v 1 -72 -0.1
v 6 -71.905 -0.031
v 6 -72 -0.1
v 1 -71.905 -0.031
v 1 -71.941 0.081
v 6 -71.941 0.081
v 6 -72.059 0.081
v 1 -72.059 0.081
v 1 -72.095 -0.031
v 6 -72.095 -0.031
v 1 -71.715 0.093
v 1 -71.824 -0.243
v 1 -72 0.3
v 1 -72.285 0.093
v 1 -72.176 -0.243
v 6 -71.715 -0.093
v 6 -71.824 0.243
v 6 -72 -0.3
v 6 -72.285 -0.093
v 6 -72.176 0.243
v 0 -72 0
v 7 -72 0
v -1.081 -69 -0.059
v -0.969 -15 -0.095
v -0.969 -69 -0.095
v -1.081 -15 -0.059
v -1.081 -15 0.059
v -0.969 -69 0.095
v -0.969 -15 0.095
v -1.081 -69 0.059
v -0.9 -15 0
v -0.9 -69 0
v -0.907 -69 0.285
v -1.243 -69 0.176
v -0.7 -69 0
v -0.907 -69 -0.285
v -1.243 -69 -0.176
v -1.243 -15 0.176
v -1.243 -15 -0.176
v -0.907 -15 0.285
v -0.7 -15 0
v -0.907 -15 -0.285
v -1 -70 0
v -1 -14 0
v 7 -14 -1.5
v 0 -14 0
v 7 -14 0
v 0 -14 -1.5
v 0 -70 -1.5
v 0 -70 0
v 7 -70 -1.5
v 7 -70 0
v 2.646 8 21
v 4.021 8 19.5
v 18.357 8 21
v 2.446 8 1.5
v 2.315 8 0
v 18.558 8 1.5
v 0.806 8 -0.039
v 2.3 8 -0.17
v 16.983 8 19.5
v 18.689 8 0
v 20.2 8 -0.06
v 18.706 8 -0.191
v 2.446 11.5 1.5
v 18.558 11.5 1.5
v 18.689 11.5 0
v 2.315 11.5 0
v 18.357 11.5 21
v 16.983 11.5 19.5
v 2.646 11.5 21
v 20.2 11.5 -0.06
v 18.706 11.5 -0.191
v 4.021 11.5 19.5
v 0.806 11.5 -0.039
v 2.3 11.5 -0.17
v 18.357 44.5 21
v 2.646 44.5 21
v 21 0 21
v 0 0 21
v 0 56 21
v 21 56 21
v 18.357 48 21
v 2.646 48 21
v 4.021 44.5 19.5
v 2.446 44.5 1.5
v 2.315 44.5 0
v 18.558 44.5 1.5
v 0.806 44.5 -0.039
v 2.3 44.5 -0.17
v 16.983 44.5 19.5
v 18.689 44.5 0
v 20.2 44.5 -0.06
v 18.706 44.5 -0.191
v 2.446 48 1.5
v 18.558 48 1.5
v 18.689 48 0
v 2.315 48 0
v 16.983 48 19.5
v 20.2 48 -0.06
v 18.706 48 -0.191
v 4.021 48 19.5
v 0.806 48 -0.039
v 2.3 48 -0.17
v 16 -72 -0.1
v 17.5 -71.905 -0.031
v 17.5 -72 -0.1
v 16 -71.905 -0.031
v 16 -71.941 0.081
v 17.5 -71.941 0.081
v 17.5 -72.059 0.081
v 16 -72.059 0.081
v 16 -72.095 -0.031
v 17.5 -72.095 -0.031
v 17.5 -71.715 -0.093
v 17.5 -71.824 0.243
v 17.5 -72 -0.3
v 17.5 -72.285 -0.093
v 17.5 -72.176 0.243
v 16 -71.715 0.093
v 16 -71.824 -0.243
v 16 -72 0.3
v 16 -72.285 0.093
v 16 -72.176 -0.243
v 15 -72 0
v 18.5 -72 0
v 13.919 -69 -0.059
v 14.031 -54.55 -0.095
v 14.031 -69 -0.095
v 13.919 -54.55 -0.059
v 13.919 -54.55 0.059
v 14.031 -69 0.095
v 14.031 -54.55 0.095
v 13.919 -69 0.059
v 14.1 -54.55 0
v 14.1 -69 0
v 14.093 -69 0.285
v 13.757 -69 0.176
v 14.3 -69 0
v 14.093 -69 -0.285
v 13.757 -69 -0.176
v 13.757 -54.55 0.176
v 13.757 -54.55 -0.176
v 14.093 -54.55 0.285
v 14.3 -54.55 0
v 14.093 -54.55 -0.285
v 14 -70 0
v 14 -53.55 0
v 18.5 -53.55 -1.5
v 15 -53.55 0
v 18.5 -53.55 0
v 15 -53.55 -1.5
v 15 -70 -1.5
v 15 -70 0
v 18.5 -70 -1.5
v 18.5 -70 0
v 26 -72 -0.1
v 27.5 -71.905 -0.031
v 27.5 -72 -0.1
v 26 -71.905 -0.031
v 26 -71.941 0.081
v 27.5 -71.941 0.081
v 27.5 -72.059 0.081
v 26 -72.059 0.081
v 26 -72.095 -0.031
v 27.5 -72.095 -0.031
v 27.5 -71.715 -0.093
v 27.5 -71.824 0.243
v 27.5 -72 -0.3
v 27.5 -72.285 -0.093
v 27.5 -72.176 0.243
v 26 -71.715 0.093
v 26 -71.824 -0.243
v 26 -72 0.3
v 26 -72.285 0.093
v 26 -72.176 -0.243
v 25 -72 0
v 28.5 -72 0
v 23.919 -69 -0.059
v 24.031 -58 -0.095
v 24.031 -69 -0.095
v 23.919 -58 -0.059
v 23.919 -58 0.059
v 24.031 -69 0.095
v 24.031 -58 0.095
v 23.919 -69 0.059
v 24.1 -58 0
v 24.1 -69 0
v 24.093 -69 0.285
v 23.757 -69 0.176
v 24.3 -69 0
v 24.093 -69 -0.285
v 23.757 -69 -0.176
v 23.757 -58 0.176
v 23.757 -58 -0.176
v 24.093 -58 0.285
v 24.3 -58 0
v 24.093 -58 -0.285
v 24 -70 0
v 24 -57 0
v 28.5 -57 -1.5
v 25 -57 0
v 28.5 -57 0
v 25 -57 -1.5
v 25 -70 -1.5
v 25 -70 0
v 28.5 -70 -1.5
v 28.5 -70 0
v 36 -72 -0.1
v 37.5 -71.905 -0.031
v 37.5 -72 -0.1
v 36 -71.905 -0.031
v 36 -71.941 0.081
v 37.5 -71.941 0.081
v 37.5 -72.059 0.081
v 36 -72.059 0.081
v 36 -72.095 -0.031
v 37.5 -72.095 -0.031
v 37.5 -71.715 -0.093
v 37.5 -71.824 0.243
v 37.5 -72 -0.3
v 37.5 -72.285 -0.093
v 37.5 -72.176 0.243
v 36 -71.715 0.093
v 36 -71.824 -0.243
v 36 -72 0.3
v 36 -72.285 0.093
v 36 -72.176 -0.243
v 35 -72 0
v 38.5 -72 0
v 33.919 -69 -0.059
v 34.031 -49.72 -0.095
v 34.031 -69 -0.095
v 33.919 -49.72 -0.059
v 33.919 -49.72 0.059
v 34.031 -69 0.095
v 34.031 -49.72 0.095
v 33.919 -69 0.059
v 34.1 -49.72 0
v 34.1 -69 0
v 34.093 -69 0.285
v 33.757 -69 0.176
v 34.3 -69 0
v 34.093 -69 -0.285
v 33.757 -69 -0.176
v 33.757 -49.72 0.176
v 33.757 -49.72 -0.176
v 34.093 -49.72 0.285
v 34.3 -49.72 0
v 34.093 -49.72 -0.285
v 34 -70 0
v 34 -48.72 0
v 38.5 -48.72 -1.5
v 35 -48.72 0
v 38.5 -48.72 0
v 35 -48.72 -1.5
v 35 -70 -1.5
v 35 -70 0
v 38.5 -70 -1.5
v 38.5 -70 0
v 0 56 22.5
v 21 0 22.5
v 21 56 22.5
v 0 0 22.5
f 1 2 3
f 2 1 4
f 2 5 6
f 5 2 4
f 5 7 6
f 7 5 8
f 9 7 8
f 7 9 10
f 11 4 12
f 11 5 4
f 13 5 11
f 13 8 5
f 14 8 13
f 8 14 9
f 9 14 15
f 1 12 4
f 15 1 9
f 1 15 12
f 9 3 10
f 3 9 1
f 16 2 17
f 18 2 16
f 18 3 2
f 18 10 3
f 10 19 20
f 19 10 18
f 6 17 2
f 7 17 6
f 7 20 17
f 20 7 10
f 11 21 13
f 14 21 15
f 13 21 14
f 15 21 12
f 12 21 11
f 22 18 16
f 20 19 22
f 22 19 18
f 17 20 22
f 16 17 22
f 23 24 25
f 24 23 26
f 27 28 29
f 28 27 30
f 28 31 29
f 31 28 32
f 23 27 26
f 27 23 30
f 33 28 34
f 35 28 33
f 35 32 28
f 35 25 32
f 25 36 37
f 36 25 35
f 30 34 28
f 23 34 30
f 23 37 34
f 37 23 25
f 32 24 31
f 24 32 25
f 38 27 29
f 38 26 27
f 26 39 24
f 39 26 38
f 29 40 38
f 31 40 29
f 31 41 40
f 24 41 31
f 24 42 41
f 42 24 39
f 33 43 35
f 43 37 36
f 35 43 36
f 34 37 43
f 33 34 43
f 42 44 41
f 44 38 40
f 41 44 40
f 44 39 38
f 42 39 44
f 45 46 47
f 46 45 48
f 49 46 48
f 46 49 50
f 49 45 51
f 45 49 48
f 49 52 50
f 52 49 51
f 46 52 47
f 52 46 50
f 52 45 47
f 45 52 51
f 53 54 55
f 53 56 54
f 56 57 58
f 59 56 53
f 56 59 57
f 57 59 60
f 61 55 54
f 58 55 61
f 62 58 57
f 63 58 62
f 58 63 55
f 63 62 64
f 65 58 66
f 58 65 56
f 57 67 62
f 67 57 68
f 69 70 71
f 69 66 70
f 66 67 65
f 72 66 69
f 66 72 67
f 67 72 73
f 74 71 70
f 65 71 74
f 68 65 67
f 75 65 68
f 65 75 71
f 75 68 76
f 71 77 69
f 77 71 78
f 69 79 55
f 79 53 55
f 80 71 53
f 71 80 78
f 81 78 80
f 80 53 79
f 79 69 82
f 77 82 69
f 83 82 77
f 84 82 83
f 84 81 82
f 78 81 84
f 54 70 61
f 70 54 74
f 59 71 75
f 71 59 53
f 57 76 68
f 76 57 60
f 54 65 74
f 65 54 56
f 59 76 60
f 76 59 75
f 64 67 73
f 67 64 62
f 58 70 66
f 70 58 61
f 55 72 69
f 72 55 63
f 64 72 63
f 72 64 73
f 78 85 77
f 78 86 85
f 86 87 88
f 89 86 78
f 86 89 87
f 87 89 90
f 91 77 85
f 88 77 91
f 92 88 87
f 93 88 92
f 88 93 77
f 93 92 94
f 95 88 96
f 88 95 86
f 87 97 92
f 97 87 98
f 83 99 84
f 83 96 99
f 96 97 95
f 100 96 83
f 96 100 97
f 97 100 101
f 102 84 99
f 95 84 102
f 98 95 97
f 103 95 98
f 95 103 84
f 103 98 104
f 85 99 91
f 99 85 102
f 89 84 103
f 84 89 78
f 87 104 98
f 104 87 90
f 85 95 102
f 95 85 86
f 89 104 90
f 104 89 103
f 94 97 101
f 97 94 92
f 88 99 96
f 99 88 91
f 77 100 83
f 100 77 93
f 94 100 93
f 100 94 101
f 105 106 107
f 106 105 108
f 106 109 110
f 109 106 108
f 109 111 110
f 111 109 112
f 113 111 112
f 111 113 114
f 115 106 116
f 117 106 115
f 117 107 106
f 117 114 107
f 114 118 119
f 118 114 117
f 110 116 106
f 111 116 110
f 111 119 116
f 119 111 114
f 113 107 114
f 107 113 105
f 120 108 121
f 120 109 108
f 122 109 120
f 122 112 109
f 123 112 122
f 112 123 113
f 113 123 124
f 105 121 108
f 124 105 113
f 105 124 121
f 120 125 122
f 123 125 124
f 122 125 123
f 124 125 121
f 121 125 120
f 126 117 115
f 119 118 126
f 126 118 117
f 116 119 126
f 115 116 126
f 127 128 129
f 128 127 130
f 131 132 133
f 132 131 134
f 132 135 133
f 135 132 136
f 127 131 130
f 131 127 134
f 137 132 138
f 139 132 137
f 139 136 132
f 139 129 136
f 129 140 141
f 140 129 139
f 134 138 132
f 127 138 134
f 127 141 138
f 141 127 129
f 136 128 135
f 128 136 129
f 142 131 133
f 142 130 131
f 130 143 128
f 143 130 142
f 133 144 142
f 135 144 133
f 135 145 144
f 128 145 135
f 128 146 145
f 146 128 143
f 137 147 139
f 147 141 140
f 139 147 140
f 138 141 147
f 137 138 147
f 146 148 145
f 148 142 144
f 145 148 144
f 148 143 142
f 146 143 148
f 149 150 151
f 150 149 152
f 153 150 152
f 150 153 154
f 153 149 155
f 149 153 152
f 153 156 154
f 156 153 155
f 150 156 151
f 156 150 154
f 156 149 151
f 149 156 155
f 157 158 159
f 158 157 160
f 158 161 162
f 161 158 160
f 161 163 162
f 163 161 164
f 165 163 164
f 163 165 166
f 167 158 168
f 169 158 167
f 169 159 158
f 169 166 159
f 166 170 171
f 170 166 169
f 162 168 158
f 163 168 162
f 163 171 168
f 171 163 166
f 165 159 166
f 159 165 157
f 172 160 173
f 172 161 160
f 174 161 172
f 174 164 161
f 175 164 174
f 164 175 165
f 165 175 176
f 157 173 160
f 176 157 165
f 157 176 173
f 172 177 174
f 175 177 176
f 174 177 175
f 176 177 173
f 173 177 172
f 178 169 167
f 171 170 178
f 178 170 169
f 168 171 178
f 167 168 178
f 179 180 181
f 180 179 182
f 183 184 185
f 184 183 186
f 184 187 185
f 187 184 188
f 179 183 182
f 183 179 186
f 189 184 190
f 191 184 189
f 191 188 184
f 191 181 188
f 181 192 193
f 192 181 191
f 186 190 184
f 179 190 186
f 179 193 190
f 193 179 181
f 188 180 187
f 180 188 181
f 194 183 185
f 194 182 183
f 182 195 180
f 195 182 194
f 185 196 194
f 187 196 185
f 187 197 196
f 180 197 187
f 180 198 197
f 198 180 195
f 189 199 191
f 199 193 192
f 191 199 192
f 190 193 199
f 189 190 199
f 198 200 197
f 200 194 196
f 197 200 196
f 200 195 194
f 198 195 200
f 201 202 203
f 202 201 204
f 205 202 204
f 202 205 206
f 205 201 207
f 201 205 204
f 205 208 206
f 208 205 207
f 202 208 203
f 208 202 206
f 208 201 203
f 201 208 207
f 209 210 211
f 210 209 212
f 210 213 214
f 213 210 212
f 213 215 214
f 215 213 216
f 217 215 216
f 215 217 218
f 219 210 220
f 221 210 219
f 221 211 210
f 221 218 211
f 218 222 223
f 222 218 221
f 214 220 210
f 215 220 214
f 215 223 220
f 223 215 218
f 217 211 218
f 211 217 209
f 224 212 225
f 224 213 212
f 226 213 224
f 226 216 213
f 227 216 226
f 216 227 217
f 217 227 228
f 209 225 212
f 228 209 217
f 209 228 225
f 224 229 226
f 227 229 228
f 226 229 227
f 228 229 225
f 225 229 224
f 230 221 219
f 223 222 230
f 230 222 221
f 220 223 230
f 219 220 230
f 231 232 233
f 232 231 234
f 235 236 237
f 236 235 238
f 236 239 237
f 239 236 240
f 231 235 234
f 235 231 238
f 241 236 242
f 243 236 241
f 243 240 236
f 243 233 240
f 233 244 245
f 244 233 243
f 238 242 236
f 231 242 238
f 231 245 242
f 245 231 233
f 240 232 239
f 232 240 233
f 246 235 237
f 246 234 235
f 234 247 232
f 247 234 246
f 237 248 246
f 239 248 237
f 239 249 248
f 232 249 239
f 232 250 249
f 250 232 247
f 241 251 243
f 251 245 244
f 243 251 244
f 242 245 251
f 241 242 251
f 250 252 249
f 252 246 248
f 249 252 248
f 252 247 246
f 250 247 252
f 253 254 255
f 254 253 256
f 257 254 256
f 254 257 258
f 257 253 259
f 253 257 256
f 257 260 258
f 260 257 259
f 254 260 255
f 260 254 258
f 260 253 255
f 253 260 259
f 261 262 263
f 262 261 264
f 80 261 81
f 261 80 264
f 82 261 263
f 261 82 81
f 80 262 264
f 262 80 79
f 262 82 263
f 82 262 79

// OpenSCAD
// file: ../lib/common.scad
//--------------------------------------------------------------------------------------------------
// Module Prism
//--------------------------------------------------------------------------------------------------
module prism(z, y, x)
{
    rotate([0, 90, 0])
    {
        polyhedron(
                points=[[0,0,0], [x,0,0], [x,y,0], [0,y,0], [0,y,z], [x,y,z]],
                faces=[[0,1,2,3],[5,4,3,2],[0,4,5,1],[0,3,4],[5,2,1]]);
    }
}

//--------------------------------------------------------------------------------------------------
// Module Side panel
//--------------------------------------------------------------------------------------------------
module rect_cut(x, y, z, dx, dy)
{
    // Top panel
    translate([0, dy, 0])
    {
        cube([x, y - dy, z]);
    };

    // Left bottom panel
    translate([0, 0, 0])
    {
        cube([dx, dy, z]);
    };

    // Triangle
    translate([dx, 0, 0])
    {
        rotate([0, 0, 0])
        {
            prism(x - dx, dy, -z);
        }
    };
}

//--------------------------------------------------------------------------------------------------
// X dimensional arrow
//--------------------------------------------------------------------------------------------------
module arrow_x(l)
{
    line_w = 0.1;
    arrow_w = 1;
    arrow_h = 0.3;

    // Line
    translate([l / 2, 0, 0])
    {
        rotate([0, 90, 0])
        {
            color([0.4, 0.4, 0.4])
            cylinder(l - arrow_w * 2, line_w, line_w, true);
        }
    }

    // Left arrow
    translate([arrow_w, 0, 0])
    {
        rotate([0, 270, 0])
        {
            color([0.4, 0.4, 0.4])
            cylinder(arrow_w, arrow_h, 0, false);
        }
    }

    // Right arrow
    translate([l - arrow_w, 0, 0])
    {
        rotate([0, 90, 0])
        {
            color([0.4, 0.4, 0.4])
            cylinder(arrow_w, arrow_h, 0, false);
        }
    }

    // Text
    translate([l/3, 0.5, 0])
    {
        color([0.4, 0.4, 0.4])
        text(str(l), size=1);
    }
}

//--------------------------------------------------------------------------------------------------
// Y dimensional arrow
//--------------------------------------------------------------------------------------------------
module arrow_y(l)
{
    line_w = 0.1;
    arrow_w = 1;
    arrow_h = 0.3;

    // Line
    translate([0, l / 2, 0])
    {
        rotate([90, 0, 00])
        {
            color([0.4, 0.4, 0.4])
            cylinder(l - arrow_w * 2, line_w, line_w, true);
        }
    }

    // Left arrow
    translate([0 ,arrow_w, 0])
    {
        rotate([90, 0, 0])
        {
            color([0.4, 0.4, 0.4])
            cylinder(arrow_w, arrow_h, 0, false);
        }
    }

    // Right arrow
    translate([0, l - arrow_w, 0])
    {
        rotate([270, 0, 0])
        {
            color([0.4, 0.4, 0.4])
            cylinder(arrow_w, arrow_h, 0, false);
        }
    }

    // Text
    translate([-0.5, l/3, 0])
    {
        rotate([0 ,0, 90])
        {
            color([0.4, 0.4, 0.4])
            text(str(l), size=1);
        }
    }
}

//--------------------------------------------------------------------------------------------------
// Z dimensional arrow
//--------------------------------------------------------------------------------------------------
module arrow_z(l)
{
    line_w = 0.11;
    arrow_w = 1;
    arrow_h = 0.3;

    // Line
    translate([0, 0, l / 2])
    {
        rotate([0, 0, 0])
        {
            color([0.4, 0.4, 0.4])
            cylinder(l - arrow_w * 2, line_w, line_w, true);
        }
    }

    // Left arrow
    translate([0, 0, arrow_w])
    {
        rotate([0, 180, 0])
        {
            color([0.4, 0.4, 0.4])
            cylinder(arrow_w, arrow_h, 0, false);
        }
    }

    // Right arrow
    translate([0, 0, l - arrow_w])
    {
        rotate([0, 0, 0])
        {
            color([0.4, 0.4, 0.4])
            cylinder(arrow_w, arrow_h, 0, false);
        }
    }

    // Text
    translate([0.5, 0, l/3])
    {
        rotate([90 ,0, 90])
        {
            color([0.4, 0.4, 0.4])
            text(str(l), size=1);
        }
    }
}

//--------------------------------------------------------------------------------------------------
// parallelogram
//--------------------------------------------------------------------------------------------------
module parallelogram(x = 12, y = 12, z = 1, xd = 0)
{
    points = [
        [0, 0, 0 ],        //0
        [x, 0, 0 ],        //1
        [x + xd, y, 0],    //2
        [xd, y, 0 ],       //3
        [0, 0, z ],        //4
        [x, 0, z ],        //5
        [x + xd, y, z ],   //6
        [xd, y, z ]];      //7

    faces = [
        [0,1,2,3],         // bottom
        [4,5,1,0],         // front
        [7,6,5,4],         // top
        [5,6,2,1],         // right
        [6,7,3,2],         // back
        [7,4,0,3]];        // left

    polyhedron(points, faces);
}

//--------------------------------------------------------------------------------------------------
// common board
//--------------------------------------------------------------------------------------------------
module board(w, h, d, r, g, b)
{
    color([r, g, b])
    cube([w, h, d]);
}

//--------------------------------------------------------------------------------------------------
// board dimension
//--------------------------------------------------------------------------------------------------
module dimension(w, h, d, r, g, b, part_x, part_y)
{
    translate([part_x, -part_y, 0])
    {
        rotate([-90, 0, 0])
        {
            board(w, h, d, r, g, b);
        }
            
        translate([0, -2, 0])
        {
            color([0, 0, 0])
            arrow_x(w);
        };

        translate([-1, 0, 0])
        {
            color([0, 0, 0])
            arrow_y(d);
        };
    }
}
// main file
/*
21 X 56
*/

include <../lib/common.scad>

// Top
// 56
dimension(7, 1.5, 56, 0.5, 0.5, 0, 0, 70);

translate([0, 0, 21])
{
    board(7, 56, 1.5, 0.5, 0.5, 0);
}

translate([7, 0, 21])
{
    board(7, 56, 1.5, 0.5, 0.5, 0);
}

translate([14, 0, 21])
{
    board(7, 56, 1.5, 0.5, 0.5, 0);
}

// legs
translate([0,11.5,0])
{
    translate([2.25, 0, 0])
    {
        rotate([0, 0, 270])
        {
            board(3.5, 16.45, 1.5, 0.5, 0.8, 0.8);
        }
    }

    translate([4, 0, 19.5])
    {
        rotate([0, 0, 270])
        {
            board(3.5, 13, 1.5, 1, 0.8, 0.8);
        }
    }

    translate([2.3, 0, -0.17])
    {
        rotate([85, 0, 270])
        {
            board(3.5, 21.28, 1.5, 0, 0.3, 1);
        }
    }

    translate([20.2, 0, -0.06])
    {
        rotate([95, 0, 270])
        {
            board(3.5, 21.28, 1.5, 0, 0.3, 1);
        }
    }
}

translate([0,48,0])
{
    translate([2.25, 0, 0])
    {
        rotate([0, 0, 270])
        {
            board(3.5, 16.45, 1.5, 0.5, 0.8, 0.8);
        }
    }

    translate([4, 0, 19.5])
    {
        rotate([0, 0, 270])
        {
            board(3.5, 13, 1.5, 1, 0.8, 0.8);
        }
    }

    translate([2.3, 0, -0.17])
    {
        rotate([85, 0, 270])
        {
            board(3.5, 21.28, 1.5, 0, 0.3, 1);
        }
    }

    translate([20.2, 0, -0.06])
    {
        rotate([95, 0, 270])
        {
            board(3.5, 21.28, 1.5, 0, 0.3, 1);
        }
    }
}

dimension(3.5, 1.5, 16.45, 0.5, 0.8, 0.8, 15, 70);
dimension(3.5, 1.5, 13, 1, 0.8, 0.8, 25, 70);
dimension(3.5, 1.5, 21.28, 0, 0.3, 1, 35, 70);
